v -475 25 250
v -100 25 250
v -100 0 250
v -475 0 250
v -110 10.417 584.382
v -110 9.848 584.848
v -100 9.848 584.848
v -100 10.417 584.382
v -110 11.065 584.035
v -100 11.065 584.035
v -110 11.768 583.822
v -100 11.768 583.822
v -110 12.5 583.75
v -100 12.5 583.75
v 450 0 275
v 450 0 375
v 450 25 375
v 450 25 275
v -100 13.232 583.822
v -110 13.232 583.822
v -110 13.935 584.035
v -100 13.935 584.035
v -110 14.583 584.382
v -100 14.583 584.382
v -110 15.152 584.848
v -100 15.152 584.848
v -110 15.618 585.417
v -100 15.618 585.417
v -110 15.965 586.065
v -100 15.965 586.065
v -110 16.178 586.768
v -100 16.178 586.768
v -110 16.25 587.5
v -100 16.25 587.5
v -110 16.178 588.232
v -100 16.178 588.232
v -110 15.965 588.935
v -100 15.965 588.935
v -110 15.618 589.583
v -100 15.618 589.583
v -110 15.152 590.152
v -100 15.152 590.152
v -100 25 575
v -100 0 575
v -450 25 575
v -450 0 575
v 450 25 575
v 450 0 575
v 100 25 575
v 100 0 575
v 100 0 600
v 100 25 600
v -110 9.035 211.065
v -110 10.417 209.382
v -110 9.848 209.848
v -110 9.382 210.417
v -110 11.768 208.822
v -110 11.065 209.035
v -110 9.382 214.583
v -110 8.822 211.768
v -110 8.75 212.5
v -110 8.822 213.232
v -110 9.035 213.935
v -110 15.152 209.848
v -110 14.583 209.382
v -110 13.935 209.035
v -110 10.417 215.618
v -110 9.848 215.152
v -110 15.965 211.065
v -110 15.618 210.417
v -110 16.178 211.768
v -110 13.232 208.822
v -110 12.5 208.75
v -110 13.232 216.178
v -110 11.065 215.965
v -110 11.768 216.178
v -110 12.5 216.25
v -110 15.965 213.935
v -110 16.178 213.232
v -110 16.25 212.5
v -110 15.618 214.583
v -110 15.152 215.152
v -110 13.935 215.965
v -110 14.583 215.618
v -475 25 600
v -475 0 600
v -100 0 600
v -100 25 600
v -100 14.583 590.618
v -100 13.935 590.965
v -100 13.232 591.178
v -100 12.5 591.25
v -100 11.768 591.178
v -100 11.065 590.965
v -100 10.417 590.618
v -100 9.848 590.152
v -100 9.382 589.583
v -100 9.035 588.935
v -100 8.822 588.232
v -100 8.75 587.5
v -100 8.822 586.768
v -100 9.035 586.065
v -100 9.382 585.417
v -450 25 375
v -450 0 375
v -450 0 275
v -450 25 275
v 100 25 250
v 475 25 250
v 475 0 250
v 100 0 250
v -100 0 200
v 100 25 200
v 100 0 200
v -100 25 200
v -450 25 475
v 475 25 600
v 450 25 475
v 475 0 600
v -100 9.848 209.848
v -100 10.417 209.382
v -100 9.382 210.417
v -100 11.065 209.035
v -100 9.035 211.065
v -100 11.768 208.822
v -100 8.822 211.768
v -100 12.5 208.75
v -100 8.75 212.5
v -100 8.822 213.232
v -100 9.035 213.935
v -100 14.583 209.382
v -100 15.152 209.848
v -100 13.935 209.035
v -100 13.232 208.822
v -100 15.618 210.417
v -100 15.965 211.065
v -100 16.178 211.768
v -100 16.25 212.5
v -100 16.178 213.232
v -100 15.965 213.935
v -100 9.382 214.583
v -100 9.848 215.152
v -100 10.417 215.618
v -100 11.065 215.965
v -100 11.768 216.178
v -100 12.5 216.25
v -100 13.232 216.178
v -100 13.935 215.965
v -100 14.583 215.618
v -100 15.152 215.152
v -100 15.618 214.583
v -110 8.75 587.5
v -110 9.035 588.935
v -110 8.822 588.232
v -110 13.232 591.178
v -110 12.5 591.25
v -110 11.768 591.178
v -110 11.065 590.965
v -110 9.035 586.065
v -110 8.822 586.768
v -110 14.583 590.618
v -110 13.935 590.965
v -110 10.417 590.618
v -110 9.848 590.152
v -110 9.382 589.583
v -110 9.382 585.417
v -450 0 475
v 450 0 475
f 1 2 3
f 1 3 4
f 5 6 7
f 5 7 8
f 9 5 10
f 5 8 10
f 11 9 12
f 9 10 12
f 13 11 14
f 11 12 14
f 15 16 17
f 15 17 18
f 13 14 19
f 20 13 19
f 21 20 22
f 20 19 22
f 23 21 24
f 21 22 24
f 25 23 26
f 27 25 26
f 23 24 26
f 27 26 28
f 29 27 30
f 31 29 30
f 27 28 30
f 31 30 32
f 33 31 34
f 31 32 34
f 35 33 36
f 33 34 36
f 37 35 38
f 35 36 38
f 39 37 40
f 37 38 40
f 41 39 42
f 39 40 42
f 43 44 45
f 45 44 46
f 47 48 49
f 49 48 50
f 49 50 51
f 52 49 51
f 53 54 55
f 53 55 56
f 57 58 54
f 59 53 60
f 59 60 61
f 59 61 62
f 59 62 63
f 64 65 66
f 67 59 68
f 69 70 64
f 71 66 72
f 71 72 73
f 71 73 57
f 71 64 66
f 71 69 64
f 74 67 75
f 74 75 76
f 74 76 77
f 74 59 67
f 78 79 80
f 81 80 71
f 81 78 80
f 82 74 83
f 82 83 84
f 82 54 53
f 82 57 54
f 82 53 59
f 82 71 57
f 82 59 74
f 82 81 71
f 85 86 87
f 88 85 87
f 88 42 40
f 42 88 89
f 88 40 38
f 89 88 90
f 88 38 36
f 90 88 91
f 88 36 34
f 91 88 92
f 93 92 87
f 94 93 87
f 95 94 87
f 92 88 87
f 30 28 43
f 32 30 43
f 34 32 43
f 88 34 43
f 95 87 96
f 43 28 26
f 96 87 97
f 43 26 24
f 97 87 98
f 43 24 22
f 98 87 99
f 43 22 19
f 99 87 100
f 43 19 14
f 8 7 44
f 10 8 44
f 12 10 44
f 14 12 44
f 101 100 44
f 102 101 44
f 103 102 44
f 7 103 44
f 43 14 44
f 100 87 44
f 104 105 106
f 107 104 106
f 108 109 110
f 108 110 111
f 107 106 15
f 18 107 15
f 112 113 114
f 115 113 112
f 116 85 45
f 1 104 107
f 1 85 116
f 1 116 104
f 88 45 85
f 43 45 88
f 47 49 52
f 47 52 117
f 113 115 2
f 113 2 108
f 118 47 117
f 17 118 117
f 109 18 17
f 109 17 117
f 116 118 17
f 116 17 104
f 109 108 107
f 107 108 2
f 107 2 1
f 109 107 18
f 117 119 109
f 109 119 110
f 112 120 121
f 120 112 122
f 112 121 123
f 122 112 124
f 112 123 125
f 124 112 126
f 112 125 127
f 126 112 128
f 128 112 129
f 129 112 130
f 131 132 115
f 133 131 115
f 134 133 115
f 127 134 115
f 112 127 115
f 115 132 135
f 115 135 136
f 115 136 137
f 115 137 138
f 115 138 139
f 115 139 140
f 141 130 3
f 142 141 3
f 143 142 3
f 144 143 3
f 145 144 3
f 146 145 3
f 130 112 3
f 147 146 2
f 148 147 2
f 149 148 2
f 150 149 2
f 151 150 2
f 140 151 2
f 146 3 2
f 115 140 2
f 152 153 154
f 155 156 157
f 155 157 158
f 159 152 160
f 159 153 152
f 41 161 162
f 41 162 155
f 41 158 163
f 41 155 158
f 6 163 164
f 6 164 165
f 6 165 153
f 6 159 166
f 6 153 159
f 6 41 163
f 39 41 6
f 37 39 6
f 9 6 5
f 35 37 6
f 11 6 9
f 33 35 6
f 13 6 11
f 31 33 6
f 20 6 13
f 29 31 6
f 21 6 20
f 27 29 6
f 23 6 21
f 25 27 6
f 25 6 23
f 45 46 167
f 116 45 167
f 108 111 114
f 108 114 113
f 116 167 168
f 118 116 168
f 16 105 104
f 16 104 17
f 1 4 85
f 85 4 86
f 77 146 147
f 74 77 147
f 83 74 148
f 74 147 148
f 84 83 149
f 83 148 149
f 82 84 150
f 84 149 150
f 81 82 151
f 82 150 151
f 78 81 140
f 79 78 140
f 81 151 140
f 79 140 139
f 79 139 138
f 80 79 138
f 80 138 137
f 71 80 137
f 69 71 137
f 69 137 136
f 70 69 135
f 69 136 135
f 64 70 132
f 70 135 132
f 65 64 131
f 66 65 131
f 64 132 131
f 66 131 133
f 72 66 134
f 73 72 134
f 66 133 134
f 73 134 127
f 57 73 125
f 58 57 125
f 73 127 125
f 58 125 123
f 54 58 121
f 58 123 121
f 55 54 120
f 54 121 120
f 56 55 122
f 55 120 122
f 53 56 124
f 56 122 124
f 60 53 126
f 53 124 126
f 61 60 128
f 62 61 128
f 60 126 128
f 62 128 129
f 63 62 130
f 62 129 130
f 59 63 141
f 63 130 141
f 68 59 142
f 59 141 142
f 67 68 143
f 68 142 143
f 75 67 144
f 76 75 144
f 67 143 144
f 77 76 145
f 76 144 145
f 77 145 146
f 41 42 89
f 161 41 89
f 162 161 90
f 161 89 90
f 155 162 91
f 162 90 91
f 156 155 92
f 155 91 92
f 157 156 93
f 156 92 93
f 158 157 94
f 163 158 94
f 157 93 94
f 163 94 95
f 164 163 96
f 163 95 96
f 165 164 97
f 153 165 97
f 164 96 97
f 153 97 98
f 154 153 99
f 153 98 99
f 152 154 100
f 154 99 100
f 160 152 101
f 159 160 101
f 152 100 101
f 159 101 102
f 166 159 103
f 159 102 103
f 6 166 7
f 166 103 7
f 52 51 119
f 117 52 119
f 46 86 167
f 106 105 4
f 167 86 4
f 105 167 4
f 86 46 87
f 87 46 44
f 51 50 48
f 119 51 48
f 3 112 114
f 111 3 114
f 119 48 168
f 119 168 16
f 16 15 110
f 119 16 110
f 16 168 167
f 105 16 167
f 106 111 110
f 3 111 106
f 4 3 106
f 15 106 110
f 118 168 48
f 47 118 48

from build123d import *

# Parameters (mm, degrees)
CROQUIS1_W              = 900
CROQUIS1_H              = 100
CROQUIS1_H_2            = 300
CROQUIS1_H_3            = 150
SALIENTE_EXTRUIR2_DEPTH = 25
CORTAR_EXTRUIR1_DEPTH   = 10
CROQUIS3_W              = 950
CROQUIS3_H              = 25
CORTAR_EXTRUIR2_DEPTH   = 850
CROQUIS4_W              = 200
CROQUIS4_H              = 25
SALIENTE_EXTRUIR3_DEPTH = 50
CROQUIS5_R              = 3.75
SALIENTE_EXTRUIR4_DEPTH = 10


with BuildPart() as part:
    # Croquis1 → Saliente-Extruir2 (new body)
    with BuildSketch(Plane(origin=(0, 0, 0), x_dir=(1, 0, 0), z_dir=(0, 1, 0))):
        Polygon((450, -475), (450, -575), (100, -575), (100, -600), (475, -600), (475, 600), (-475, 600), (-475, -600), (-100, -600), (-100, -575), (-450, -575), (-450, -475), align=None)
        with Locations((0, -325)):
            Rectangle(CROQUIS1_W, CROQUIS1_H, mode=Mode.SUBTRACT)
        with Locations((0, -25)):
            Rectangle(CROQUIS1_W, CROQUIS1_H_2, mode=Mode.SUBTRACT)
        with Locations((0, 350)):
            Rectangle(CROQUIS1_W, CROQUIS1_H_3, mode=Mode.SUBTRACT)
    extrude(amount=SALIENTE_EXTRUIR2_DEPTH)

    # Croquis2 → Cortar-Extruir1 (cut)
    with BuildSketch(Plane(origin=(-100, 0, 0), x_dir=(0, 0, -1), z_dir=(1, 0, 0))):
        with BuildLine():
            ThreePointArc((-583.75, 12.5), (-586.064937129, 15.964548247), (-590.151650429, 15.151650429))
            Line((-590.151650429, 15.151650429), (-584.848349571, 9.848349571))
            ThreePointArc((-584.848349571, 9.848349571), (-584.035451753, 11.064937129), (-583.75, 12.5))
        make_face()
        with BuildLine():
            Line((-584.848349571, 9.848349571), (-590.151650429, 15.151650429))
            ThreePointArc((-590.151650429, 15.151650429), (-590.151650429, 9.848349571), (-584.848349571, 9.848349571))
        make_face()
    extrude(amount=-CORTAR_EXTRUIR1_DEPTH, mode=Mode.SUBTRACT)

    # Croquis3 → Cortar-Extruir2 (cut)
    with BuildSketch(Plane(origin=(0, 0, -600), x_dir=(-1, 0, 0), z_dir=(0, 0, -1))):
        with Locations((0, 12.5)):
            Rectangle(CROQUIS3_W, CROQUIS3_H)
    extrude(amount=-CORTAR_EXTRUIR2_DEPTH, mode=Mode.SUBTRACT)

    # Croquis4 → Saliente-Extruir3 (add)
    with BuildSketch(Plane(origin=(0, 0, 250), x_dir=(-1, 0, 0), z_dir=(0, 0, -1))):
        with Locations((0, 12.5)):
            Rectangle(CROQUIS4_W, CROQUIS4_H)
    extrude(amount=SALIENTE_EXTRUIR3_DEPTH)

    # Croquis5 → Saliente-Extruir4 (add)
    with BuildSketch(Plane.ZY.offset(100)):
        with Locations((212.5, 12.5)):
            Circle(CROQUIS5_R)
    extrude(amount=SALIENTE_EXTRUIR4_DEPTH)


solid = part.part
